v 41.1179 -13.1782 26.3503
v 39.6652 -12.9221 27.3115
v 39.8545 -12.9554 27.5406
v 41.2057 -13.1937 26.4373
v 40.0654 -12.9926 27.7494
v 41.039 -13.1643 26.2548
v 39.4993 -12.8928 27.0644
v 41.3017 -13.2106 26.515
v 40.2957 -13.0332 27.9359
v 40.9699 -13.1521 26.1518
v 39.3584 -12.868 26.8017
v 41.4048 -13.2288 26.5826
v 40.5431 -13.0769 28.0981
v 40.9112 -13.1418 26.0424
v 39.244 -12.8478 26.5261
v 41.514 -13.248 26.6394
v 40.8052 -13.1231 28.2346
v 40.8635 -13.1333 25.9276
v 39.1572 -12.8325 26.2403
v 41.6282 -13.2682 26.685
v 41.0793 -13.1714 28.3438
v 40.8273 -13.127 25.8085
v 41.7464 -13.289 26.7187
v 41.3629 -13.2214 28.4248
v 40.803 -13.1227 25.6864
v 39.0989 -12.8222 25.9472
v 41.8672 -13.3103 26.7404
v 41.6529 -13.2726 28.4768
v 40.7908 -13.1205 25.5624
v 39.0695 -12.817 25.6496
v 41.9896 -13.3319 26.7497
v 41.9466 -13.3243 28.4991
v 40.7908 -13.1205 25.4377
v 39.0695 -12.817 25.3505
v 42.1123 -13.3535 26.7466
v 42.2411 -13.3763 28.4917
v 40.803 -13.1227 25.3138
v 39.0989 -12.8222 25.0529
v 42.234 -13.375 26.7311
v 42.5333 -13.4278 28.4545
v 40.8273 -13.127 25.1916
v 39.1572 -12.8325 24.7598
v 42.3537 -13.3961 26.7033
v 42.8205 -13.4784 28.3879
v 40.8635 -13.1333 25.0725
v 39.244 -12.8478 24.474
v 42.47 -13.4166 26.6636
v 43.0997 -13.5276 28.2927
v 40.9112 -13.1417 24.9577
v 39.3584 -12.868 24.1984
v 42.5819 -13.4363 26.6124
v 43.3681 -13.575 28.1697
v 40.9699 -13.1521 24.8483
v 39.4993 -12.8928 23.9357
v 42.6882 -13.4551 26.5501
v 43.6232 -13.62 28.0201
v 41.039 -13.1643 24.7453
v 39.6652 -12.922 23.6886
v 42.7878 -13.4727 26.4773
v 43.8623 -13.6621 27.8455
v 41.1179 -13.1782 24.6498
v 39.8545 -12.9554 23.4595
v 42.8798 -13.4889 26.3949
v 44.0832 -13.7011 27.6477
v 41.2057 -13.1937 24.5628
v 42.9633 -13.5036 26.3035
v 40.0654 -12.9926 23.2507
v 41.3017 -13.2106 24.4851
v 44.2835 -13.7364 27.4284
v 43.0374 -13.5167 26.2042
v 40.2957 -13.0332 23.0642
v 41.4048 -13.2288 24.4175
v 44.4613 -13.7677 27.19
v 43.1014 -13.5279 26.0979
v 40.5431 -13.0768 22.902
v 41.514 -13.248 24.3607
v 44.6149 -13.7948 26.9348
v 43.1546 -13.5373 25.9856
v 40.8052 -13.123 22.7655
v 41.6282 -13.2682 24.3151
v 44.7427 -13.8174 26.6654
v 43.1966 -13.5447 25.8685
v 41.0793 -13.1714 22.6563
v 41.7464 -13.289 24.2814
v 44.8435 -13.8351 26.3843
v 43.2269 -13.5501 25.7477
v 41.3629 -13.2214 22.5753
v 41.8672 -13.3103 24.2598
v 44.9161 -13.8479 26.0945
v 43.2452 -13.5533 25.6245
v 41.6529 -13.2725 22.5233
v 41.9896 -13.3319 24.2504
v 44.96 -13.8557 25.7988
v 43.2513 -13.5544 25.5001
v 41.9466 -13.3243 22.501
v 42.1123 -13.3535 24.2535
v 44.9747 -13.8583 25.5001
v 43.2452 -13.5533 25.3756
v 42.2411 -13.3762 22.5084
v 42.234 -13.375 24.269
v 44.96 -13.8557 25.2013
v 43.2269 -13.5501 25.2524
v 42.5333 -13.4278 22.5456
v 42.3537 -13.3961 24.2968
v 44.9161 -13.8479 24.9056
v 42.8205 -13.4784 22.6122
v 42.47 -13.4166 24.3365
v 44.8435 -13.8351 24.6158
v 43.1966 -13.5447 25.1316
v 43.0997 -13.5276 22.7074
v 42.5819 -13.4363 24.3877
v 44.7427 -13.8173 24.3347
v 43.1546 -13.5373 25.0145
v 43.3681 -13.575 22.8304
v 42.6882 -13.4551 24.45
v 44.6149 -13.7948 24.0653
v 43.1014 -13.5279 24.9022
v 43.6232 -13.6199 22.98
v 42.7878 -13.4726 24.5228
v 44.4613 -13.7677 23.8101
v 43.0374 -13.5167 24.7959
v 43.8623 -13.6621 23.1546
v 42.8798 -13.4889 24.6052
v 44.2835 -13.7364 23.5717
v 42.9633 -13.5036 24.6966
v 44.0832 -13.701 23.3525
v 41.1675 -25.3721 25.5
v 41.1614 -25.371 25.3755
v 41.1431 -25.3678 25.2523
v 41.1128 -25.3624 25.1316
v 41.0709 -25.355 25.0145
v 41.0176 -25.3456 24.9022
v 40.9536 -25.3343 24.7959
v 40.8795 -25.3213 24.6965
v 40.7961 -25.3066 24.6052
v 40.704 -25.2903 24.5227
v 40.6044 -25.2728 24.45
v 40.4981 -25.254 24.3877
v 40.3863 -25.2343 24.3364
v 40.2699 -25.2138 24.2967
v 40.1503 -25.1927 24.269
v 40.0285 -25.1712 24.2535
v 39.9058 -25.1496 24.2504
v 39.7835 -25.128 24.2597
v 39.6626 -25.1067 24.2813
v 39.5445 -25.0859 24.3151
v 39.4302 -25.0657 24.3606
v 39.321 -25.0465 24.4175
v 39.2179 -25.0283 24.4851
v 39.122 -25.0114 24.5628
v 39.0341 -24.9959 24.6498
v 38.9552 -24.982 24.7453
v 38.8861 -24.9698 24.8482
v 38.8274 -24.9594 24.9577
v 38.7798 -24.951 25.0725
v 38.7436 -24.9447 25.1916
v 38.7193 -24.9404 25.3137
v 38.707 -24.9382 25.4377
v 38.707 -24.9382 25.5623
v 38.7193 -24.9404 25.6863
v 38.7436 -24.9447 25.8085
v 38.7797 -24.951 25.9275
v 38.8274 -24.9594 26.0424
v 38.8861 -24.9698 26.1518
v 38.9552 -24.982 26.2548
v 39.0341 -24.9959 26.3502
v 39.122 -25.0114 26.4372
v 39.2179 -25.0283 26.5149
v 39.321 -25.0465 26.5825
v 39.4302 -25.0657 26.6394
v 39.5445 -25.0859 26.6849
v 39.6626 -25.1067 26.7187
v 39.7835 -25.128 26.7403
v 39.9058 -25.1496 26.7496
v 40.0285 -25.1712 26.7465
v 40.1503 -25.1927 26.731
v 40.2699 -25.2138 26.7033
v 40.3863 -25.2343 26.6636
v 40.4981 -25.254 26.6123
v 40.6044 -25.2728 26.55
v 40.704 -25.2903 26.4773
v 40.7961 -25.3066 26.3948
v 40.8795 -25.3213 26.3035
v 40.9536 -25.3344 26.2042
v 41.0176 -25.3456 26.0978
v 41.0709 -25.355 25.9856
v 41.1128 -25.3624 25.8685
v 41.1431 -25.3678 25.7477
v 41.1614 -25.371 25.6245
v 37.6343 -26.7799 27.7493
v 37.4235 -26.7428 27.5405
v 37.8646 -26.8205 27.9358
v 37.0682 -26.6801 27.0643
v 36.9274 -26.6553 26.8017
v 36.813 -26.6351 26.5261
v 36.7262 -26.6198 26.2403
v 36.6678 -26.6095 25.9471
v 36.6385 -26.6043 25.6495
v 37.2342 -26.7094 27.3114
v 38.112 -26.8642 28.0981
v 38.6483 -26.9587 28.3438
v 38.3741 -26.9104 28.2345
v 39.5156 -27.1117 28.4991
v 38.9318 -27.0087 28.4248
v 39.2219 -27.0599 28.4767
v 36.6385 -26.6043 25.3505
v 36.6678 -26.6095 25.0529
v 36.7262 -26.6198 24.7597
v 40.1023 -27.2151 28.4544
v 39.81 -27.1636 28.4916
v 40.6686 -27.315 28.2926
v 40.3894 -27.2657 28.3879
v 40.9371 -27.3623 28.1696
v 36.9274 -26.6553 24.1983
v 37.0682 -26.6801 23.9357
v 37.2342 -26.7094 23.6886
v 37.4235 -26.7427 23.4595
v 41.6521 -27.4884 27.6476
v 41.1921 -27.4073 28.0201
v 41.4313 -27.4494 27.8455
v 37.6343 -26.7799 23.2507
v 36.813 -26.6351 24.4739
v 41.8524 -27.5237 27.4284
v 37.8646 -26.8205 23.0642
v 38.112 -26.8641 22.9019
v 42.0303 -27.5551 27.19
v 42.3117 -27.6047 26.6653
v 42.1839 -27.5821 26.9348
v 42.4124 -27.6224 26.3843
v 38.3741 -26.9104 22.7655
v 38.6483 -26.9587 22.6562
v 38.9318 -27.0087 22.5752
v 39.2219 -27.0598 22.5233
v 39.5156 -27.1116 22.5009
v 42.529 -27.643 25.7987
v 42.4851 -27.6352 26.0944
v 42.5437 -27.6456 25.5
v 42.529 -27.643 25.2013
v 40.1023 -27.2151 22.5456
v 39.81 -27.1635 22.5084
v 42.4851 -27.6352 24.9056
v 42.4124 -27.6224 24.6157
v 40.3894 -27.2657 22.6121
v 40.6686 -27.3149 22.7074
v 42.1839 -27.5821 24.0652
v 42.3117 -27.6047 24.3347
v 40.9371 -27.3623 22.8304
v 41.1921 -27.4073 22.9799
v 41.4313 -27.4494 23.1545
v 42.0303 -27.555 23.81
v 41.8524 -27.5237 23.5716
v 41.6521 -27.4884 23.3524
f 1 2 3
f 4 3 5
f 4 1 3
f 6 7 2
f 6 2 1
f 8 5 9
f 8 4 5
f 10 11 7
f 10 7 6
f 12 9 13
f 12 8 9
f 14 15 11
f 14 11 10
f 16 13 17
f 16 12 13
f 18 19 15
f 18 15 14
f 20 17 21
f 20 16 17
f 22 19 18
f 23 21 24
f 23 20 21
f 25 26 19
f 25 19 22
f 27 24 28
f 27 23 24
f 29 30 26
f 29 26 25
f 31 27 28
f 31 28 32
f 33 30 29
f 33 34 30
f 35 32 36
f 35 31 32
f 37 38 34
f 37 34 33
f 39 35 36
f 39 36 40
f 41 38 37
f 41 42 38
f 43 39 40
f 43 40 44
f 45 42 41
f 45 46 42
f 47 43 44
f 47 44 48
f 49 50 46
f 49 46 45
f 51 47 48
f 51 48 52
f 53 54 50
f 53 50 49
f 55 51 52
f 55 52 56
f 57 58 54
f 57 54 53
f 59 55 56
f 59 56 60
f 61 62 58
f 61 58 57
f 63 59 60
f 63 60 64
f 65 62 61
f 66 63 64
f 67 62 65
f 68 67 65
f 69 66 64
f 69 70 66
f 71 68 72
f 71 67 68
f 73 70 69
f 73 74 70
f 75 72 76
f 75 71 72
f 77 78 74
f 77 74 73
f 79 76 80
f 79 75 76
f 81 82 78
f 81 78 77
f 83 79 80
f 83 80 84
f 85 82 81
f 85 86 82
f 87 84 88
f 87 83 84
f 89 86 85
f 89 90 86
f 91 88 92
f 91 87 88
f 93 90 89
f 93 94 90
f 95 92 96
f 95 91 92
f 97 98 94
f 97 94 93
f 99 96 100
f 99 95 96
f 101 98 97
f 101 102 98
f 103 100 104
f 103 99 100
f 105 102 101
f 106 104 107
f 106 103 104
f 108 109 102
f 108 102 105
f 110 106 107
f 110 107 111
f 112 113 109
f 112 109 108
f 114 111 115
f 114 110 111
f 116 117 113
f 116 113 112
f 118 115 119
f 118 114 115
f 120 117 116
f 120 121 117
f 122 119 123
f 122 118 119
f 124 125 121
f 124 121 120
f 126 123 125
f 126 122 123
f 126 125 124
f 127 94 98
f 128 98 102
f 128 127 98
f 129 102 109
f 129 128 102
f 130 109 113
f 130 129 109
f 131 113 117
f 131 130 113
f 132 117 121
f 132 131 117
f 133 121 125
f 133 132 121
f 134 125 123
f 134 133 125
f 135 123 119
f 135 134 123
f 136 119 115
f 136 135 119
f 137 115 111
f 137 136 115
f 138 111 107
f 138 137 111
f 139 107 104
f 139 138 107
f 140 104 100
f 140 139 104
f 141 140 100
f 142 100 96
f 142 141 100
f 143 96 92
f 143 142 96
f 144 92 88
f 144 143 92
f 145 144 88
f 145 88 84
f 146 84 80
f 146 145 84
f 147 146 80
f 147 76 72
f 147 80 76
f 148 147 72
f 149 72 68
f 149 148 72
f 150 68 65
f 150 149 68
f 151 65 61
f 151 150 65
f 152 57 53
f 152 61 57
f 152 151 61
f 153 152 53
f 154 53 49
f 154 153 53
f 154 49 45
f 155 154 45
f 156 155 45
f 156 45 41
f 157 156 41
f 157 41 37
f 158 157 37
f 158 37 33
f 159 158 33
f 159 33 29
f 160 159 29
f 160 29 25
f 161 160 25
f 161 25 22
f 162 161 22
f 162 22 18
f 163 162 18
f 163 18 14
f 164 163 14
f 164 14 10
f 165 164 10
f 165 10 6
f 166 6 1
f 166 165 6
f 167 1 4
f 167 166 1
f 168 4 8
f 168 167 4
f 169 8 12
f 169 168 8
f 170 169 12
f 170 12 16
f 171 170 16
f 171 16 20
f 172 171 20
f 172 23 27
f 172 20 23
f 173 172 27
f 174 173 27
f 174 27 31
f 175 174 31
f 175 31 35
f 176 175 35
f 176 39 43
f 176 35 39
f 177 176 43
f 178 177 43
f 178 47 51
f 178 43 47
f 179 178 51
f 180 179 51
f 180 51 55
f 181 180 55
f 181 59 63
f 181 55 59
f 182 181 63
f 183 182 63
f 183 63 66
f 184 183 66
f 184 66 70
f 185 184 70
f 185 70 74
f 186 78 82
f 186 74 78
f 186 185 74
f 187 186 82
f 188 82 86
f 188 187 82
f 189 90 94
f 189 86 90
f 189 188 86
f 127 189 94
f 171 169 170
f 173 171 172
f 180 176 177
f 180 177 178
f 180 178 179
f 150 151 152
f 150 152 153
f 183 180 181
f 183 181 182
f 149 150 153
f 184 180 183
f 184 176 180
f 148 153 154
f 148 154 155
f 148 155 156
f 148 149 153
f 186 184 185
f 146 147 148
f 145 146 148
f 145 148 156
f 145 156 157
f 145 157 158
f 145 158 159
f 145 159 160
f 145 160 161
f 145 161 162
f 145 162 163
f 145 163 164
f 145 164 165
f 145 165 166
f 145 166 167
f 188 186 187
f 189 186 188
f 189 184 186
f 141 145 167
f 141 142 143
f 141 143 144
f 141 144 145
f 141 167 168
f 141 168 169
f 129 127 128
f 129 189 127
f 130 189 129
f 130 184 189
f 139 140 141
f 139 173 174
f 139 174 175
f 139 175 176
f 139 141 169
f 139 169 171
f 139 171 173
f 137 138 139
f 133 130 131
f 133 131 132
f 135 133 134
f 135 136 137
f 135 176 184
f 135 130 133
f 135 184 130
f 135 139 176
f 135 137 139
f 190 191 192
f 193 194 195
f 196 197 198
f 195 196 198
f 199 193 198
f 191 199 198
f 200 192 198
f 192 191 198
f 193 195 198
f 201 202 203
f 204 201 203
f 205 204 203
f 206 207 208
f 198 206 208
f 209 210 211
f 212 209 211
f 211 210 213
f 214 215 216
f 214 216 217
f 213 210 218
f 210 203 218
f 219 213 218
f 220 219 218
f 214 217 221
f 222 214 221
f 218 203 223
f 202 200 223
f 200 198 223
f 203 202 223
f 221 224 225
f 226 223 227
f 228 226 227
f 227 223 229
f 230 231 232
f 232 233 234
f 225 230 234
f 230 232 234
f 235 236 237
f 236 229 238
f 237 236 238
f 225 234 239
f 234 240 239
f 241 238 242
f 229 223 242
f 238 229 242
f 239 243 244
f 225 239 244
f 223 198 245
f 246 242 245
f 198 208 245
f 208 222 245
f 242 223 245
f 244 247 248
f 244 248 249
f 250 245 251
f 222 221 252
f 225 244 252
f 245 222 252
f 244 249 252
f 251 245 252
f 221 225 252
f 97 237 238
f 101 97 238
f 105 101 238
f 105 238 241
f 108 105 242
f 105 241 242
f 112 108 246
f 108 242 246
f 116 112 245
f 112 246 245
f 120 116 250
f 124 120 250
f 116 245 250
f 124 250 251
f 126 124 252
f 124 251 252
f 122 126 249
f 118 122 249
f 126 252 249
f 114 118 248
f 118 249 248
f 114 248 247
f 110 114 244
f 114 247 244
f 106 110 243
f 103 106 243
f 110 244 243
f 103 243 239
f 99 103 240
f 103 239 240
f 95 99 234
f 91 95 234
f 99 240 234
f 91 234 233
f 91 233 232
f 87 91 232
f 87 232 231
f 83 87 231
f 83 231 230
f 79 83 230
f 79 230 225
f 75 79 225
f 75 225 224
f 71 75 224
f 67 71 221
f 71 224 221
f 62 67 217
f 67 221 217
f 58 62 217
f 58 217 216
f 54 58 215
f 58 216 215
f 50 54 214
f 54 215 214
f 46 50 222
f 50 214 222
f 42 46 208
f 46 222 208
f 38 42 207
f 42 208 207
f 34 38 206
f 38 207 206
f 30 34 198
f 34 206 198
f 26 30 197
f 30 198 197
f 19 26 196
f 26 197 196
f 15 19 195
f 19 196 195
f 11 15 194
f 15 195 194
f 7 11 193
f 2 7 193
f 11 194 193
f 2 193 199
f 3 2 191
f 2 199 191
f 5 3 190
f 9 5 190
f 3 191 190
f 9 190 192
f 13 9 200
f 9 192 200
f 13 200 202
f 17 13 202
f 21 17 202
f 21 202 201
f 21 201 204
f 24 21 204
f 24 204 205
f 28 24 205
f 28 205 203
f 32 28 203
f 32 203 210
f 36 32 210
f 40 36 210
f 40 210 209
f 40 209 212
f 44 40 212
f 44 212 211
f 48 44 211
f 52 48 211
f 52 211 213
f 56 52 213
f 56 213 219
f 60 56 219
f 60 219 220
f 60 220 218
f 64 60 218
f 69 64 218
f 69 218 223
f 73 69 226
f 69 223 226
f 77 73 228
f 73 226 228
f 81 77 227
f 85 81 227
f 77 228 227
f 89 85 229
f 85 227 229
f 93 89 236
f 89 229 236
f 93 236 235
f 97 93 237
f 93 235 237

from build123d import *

# Parameters (mm, degrees)
CYLINDER037_R               = 1.25
CYLINDER037_DEPTH           = 14
CYLINDER037_ROLL_ANGLE      = -89.999776
CYLINDER037_PITCH_ANGLE     = 1.4e-05
CYLINDER037_PLACEMENT_ANGLE = -9.999925
CYLINDER029_R               = 3
CYLINDER029_DEPTH           = 14
CYLINDER029_ROLL_ANGLE      = -89.999776
CYLINDER029_PITCH_ANGLE     = 1.4e-05
CYLINDER029_PLACEMENT_ANGLE = -9.999925


with BuildPart() as cylinder037:
    # Cylinder037 → Cylinder037 (new body)
    with BuildSketch(Plane.XY):
        Circle(CYLINDER037_R)
    extrude(amount=CYLINDER037_DEPTH)


with BuildPart() as cylinder037_1:
    # Cylinder037 roll: moved
    add(cylinder037.part.rotate(Axis((0, 0, 0), (1, 0, 0)), CYLINDER037_ROLL_ANGLE))


with BuildPart() as cylinder037_2:
    # Cylinder037 pitch: moved
    add(cylinder037_1.part.rotate(Axis((0, 0, 0), (0, 1, 0)), CYLINDER037_PITCH_ANGLE))


with BuildPart() as cylinder037_3:
    # Cylinder037 placement: moved
    add(cylinder037_2.part.moved(Location((39.936521, -25.15501, 25.500007))).rotate(Axis((39.936521, -25.15501, 25.500007), (0, 0, 1)), CYLINDER037_PLACEMENT_ANGLE))


with BuildPart() as cut034:
    # Cylinder029 → Cylinder029 (new body)
    with BuildSketch(Plane.XY):
        Circle(CYLINDER029_R)
    extrude(amount=CYLINDER029_DEPTH)


with BuildPart() as cut034_1:
    # Cylinder029 roll: moved
    add(cut034.part.rotate(Axis((0, 0, 0), (1, 0, 0)), CYLINDER029_ROLL_ANGLE))


with BuildPart() as cut034_2:
    # Cylinder029 pitch: moved
    add(cut034_1.part.rotate(Axis((0, 0, 0), (0, 1, 0)), CYLINDER029_PITCH_ANGLE))


with BuildPart() as cut034_3:
    # Cylinder029 placement: moved
    add(cut034_2.part.moved(Location((39.589228, -27.124626, 25.499999))).rotate(Axis((39.589228, -27.124626, 25.499999), (0, 0, 1)), CYLINDER029_PLACEMENT_ANGLE))

    # Cut034: cut Cylinder037
    add(cylinder037_3.part, mode=Mode.SUBTRACT)


solid = cut034_3.part
